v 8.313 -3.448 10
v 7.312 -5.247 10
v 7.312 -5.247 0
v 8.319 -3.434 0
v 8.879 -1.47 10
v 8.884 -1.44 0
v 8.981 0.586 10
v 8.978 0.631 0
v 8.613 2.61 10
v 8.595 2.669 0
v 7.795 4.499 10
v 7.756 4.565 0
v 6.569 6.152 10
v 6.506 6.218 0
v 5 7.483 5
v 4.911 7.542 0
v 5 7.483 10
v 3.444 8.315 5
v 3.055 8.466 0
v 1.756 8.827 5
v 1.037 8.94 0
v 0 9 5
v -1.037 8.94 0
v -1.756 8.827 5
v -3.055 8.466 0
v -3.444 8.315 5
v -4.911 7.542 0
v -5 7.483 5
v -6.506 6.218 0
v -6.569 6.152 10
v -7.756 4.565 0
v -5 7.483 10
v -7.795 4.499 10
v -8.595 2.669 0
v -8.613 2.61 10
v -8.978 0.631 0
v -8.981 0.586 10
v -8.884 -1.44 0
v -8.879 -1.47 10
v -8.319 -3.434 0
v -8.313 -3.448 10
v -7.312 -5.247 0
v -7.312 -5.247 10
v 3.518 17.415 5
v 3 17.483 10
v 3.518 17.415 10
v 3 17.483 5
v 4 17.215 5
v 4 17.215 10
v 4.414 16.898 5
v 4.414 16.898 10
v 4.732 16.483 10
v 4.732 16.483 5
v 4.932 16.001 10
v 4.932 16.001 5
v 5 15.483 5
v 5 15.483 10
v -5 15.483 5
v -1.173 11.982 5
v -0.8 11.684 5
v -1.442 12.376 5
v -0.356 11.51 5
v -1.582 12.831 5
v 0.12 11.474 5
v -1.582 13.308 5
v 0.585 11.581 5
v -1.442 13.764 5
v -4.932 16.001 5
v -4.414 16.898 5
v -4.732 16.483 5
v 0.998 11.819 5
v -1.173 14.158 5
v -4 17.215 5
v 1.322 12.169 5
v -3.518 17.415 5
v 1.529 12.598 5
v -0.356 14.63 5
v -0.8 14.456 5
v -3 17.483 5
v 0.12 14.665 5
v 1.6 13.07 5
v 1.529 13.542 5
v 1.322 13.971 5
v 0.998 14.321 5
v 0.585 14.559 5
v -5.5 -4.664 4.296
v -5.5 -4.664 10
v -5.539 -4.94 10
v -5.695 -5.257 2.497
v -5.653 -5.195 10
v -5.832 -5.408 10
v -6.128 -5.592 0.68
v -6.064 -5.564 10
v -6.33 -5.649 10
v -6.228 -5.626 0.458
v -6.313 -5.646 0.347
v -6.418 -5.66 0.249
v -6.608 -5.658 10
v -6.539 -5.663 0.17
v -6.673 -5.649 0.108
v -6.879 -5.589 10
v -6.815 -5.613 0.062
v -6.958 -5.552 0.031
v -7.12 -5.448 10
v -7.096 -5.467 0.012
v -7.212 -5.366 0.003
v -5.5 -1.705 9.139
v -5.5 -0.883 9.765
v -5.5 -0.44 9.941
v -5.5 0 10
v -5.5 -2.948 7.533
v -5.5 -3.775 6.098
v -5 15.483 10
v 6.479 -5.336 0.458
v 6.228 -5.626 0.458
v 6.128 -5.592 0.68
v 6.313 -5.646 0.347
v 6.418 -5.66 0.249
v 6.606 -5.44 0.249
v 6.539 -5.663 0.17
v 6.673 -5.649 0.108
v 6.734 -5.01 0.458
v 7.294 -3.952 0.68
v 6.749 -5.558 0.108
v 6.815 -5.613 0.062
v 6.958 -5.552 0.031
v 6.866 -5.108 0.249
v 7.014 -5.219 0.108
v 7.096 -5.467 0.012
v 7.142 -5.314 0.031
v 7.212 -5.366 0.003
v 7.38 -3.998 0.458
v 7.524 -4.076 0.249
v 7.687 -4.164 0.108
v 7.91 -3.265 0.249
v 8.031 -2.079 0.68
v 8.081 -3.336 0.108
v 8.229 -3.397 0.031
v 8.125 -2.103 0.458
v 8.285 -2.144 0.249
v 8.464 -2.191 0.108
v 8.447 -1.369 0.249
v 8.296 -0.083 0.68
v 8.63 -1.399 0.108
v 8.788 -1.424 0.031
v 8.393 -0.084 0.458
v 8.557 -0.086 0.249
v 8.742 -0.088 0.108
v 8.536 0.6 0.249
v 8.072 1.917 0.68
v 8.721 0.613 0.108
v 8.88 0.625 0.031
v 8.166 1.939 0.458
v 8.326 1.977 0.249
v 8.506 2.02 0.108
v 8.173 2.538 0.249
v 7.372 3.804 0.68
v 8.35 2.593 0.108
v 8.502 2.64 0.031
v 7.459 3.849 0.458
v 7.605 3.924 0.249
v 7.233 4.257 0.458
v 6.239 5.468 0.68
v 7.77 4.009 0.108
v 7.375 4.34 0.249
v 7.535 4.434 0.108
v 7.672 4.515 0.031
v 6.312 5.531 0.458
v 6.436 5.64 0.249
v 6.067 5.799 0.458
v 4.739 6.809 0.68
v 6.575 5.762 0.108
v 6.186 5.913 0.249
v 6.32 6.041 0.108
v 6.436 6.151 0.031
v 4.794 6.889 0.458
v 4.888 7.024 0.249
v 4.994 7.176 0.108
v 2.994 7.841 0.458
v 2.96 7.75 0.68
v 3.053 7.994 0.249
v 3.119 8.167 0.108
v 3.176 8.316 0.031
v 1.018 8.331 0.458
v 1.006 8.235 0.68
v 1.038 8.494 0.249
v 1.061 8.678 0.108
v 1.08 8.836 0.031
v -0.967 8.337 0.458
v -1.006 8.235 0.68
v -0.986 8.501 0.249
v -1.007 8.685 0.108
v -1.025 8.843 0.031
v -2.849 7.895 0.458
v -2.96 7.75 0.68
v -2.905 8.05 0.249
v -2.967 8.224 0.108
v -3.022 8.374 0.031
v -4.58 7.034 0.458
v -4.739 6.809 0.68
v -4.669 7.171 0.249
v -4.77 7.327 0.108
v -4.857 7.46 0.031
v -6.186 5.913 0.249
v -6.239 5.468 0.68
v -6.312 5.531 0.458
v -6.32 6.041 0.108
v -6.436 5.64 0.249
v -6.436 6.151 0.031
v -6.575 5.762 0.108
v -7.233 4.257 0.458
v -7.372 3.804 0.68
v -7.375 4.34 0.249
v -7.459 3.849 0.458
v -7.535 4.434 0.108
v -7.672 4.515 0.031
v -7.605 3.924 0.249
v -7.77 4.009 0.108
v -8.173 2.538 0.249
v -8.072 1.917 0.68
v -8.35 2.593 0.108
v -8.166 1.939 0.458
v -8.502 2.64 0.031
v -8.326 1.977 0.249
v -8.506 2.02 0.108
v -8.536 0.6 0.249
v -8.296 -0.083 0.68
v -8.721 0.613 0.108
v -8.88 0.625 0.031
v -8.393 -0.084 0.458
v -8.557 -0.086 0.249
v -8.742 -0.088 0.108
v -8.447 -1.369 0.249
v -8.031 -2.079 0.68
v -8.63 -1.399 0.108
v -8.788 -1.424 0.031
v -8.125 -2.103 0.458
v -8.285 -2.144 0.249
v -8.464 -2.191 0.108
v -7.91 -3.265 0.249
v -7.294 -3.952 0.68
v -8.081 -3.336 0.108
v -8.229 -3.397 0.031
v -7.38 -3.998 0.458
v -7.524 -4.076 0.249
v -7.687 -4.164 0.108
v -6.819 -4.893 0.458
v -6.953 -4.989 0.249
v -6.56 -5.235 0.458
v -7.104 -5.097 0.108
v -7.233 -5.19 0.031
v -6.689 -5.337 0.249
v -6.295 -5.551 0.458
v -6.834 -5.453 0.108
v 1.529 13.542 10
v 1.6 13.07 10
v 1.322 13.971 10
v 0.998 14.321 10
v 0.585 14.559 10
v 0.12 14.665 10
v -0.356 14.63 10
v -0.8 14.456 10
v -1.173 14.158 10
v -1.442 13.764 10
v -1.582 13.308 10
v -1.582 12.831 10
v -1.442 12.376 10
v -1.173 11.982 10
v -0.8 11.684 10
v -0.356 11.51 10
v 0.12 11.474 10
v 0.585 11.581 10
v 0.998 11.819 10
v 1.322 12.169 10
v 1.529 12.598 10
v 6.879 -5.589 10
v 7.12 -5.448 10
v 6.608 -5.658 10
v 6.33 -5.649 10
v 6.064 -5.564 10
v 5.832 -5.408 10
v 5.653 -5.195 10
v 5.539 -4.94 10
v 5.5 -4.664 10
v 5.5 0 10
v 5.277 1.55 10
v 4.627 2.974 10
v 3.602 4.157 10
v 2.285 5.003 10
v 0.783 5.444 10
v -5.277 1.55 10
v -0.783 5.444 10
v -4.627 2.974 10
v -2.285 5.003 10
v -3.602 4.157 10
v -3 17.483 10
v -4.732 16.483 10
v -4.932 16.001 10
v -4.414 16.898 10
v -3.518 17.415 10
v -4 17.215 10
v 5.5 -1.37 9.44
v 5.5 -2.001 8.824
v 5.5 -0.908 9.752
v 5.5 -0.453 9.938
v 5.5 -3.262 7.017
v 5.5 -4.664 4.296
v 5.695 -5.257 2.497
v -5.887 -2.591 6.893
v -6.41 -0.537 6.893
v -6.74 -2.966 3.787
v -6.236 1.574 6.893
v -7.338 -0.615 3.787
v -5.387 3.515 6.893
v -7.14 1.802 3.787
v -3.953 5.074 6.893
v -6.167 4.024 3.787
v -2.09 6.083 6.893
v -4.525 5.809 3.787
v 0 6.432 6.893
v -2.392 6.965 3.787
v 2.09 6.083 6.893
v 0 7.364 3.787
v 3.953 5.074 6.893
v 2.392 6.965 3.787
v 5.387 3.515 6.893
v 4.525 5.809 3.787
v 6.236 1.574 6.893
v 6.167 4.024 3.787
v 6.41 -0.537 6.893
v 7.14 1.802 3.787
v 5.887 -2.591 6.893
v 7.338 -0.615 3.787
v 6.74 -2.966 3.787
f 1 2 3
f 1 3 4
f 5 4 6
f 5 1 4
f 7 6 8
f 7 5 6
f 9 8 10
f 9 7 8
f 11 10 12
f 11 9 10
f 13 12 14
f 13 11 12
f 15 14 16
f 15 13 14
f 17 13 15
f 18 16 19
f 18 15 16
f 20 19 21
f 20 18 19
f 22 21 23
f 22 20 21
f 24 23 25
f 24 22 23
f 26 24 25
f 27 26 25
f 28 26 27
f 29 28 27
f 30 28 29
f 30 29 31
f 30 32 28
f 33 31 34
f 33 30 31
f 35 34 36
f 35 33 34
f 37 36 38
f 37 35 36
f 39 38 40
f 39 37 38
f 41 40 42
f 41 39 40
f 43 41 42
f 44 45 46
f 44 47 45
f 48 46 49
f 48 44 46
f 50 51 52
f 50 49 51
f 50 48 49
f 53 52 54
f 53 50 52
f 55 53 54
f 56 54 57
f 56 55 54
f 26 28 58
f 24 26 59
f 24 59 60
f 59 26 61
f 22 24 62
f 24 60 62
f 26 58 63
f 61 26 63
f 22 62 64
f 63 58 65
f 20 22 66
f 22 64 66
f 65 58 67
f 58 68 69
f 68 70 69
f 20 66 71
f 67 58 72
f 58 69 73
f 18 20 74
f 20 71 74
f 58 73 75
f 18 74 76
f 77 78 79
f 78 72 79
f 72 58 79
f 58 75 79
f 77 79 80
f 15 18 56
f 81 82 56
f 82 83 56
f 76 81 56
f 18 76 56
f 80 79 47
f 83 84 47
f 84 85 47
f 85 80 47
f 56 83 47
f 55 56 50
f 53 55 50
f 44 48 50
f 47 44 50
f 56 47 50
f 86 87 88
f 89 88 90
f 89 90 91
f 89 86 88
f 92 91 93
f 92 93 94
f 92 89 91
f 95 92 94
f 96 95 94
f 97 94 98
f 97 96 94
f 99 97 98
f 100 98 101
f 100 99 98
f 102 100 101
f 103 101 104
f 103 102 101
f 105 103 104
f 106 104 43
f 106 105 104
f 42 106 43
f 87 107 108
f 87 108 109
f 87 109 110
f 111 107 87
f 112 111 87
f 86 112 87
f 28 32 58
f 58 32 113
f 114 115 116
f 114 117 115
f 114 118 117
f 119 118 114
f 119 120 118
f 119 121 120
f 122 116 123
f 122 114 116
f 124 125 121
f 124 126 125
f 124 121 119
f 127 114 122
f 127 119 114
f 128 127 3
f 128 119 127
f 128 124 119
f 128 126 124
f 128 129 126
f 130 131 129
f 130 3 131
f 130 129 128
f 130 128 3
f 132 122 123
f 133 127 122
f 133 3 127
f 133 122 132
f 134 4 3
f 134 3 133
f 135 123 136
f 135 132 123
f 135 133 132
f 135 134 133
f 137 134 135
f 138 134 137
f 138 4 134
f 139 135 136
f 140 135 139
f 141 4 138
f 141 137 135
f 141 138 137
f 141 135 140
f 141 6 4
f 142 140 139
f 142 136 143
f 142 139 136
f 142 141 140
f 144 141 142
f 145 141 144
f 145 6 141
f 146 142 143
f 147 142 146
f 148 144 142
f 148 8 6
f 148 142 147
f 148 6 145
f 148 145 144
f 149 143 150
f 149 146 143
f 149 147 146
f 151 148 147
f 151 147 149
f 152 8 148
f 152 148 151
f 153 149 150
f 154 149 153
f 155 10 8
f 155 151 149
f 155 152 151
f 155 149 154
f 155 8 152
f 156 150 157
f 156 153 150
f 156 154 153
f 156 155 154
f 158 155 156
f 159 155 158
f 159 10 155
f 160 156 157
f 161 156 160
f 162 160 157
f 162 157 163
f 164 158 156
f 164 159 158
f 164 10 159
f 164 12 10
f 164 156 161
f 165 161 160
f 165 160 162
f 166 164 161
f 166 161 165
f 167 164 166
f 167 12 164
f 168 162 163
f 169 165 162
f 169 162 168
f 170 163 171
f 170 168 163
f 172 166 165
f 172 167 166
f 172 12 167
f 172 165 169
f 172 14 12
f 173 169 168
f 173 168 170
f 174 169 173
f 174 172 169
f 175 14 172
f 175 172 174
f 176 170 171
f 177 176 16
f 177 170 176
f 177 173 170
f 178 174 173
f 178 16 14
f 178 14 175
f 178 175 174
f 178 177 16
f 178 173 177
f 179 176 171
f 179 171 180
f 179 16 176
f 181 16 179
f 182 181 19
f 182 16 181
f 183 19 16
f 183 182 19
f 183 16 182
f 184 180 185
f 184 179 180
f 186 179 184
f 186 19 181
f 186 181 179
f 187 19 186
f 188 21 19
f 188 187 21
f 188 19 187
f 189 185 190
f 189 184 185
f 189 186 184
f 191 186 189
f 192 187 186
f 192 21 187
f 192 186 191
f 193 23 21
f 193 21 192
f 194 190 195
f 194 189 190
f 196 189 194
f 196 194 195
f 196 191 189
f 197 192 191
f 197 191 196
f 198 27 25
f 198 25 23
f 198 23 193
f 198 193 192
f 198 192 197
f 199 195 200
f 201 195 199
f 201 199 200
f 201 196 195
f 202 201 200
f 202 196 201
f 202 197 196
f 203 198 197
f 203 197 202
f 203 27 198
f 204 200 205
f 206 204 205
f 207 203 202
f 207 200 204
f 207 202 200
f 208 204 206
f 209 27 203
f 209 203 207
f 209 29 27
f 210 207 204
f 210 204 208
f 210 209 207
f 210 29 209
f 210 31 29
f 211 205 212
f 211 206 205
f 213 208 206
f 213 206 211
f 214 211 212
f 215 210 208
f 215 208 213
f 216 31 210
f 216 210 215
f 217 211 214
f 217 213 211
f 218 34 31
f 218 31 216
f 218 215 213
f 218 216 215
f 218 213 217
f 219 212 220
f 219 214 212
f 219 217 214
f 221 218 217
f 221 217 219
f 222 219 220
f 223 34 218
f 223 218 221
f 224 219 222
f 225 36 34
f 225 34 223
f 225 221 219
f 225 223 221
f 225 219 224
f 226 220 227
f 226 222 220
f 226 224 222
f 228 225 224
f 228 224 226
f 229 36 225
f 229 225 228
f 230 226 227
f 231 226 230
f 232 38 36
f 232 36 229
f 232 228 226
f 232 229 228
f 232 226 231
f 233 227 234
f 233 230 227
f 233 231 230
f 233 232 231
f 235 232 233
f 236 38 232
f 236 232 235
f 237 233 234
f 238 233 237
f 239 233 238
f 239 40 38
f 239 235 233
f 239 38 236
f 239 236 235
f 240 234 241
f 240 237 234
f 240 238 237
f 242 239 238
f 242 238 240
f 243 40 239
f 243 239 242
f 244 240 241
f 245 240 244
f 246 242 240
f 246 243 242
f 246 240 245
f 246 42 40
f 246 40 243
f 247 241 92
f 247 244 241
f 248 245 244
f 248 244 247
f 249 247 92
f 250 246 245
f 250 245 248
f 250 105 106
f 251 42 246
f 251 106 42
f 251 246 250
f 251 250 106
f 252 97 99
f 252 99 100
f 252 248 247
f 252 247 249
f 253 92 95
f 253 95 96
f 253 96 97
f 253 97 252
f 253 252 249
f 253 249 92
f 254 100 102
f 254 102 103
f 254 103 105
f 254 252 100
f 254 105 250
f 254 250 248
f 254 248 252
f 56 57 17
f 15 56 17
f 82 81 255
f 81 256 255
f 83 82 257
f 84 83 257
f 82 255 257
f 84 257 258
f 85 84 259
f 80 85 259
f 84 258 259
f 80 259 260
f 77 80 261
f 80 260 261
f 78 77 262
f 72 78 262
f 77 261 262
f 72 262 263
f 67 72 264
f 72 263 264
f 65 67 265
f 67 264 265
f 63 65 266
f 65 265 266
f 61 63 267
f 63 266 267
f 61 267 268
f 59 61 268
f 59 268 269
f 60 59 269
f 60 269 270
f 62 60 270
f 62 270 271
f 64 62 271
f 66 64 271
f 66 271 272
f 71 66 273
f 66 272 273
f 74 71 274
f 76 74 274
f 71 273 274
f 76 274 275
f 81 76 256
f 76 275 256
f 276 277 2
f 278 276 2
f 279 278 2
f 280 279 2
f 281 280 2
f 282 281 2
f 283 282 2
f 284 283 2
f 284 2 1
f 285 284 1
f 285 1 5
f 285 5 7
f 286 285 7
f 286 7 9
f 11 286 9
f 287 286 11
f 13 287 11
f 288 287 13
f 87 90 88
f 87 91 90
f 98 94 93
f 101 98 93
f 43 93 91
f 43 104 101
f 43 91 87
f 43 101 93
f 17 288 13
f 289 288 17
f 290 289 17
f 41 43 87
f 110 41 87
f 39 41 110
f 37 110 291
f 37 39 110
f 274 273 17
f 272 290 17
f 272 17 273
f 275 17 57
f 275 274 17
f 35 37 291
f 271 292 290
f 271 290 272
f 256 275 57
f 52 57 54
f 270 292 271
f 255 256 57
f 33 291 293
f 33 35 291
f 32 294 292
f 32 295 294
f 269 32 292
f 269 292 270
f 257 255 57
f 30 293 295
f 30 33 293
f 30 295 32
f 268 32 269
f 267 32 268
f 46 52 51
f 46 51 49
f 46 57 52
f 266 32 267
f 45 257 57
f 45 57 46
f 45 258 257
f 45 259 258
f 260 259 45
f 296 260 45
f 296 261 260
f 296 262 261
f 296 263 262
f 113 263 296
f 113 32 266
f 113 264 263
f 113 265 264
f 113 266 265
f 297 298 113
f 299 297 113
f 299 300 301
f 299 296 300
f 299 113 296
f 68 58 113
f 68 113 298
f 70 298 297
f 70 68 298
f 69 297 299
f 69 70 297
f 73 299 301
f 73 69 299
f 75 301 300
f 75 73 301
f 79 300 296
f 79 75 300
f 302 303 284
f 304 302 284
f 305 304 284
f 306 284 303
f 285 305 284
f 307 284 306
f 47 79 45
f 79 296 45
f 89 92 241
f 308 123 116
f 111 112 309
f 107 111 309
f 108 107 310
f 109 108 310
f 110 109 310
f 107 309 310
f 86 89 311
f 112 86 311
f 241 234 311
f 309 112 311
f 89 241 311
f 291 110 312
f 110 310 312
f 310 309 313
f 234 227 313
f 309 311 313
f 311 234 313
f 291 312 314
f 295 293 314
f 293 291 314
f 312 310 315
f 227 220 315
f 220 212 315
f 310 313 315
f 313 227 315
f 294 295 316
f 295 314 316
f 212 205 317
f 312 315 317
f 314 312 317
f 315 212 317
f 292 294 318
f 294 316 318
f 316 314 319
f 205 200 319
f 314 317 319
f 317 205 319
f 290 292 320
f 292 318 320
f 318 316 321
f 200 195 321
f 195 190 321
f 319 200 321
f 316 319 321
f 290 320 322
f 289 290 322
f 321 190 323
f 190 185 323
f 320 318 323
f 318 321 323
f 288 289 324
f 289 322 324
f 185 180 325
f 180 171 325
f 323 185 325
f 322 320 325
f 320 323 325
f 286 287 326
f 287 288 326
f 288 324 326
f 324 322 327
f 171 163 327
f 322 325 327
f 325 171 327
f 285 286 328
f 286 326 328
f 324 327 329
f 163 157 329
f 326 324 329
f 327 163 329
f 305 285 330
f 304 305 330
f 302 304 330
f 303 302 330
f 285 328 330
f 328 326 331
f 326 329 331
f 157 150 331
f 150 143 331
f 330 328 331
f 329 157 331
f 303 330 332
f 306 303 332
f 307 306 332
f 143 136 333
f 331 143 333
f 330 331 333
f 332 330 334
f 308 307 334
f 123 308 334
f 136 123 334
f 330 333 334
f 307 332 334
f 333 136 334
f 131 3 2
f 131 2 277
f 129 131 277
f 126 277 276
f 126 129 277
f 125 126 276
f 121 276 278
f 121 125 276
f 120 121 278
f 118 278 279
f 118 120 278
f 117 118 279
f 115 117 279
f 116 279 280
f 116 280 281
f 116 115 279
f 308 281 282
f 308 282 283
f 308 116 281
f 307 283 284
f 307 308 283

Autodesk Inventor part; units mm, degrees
ref_plane "YZ Plane" through (0, 0, 0) normal (1, 0, 0) x (0, 1, 0)
ref_plane "XZ Plane" through (0, 0, 0) normal (0, 1, 0) x (-1, 0, 0)
ref_plane "XY Plane" through (0, 0, 0) normal (0, 0, 1) x (1, 0, 0)
sketch "Sketch1" plane through (0, 0, 0) normal (1, 0, 0) x (0, 1, 0)
  line L0 (5.5, 10) -> (5.5, 10)
  line L1 (8.5, 0) -> (9, 0)
  line L2 (9, 0) -> (9, 10)
  line L3 (9, 10) -> (5.5, 10)
  line L4 (0, 0) -> (0, 4.238)
  line L5 (5.5, 10) -> (8.5, 0)
  dimension "d11" = 0
  dimension "d13" = 9
  dimension "d14" = 5.5
  dimension "d15" = 10
  dimension "d26" = 8.5
revolve "Revolution1" add sketch "Sketch1" angle 360 about axis through (0, 0, 0) along (0, 0, 1)
sketch "Sketch3" plane through (0, 0, 0) normal (0, 0, -1) x (-1, 0, 0)
  line L0 (-5.5, 0) -> (5.5, 0)
  line L1 (5.5, 0) -> (5.5, -9)
  line L2 (5.5, -9) -> (-5.5, -9)
  line L3 (-5.5, -9) -> (-5.5, 0)
  circle A0 centre (0, 0) radius 9 projected
  circle A1 centre (0, 0) radius 5.5 projected
extrude "Extrusion1" cut sketch "Sketch3" against normal blind 10 contours A1 L1 A0 L3 | L0 A1 | A0 L2 L3 | L1 L2 A0 picked at (4.148, -6.5999) picked at (-1.2514, -2.3608)
fillet "Fillet1" radius 1 5 edges at (0, 8.5, 0) (5.5, -6.8023, 0) (-5.5, -6.8023, 0) (-5.5, -7.1239, 5) (5.5, -7.1239, 5)
sketch "Sketch4" plane through (0, 0, 10) normal (0, 0, 1) x (1, 0, 0)
  line L0 (-5, 17.4833) -> (5, 17.4833)
  line L1 (5, 17.4833) -> (5, 7.4833)
  line L2 (5, 7.4833) -> (-5, 7.4833)
  line L3 (-5, 7.4833) -> (-5, 17.4833)
  circle A0 centre (0, 13.0699) radius 1.6
  arc A1 (7.3125, -5.2467) -> (-7.3125, -5.2467) centre (0, 0) ccw projected
  dimension "d19" = 10
  dimension "d21" = 10
  dimension "d22" = 3.2
  dimension "d29" = 4.4135
extrude "Extrusion2" add sketch "Sketch4" against normal blind 5 contours L0 L1 A1 L3
fillet "Fillet2" radius 2 2 edges at (5, 17.4833, 7.5) (-5, 17.4833, 7.5)
properties part number "brush rack"
